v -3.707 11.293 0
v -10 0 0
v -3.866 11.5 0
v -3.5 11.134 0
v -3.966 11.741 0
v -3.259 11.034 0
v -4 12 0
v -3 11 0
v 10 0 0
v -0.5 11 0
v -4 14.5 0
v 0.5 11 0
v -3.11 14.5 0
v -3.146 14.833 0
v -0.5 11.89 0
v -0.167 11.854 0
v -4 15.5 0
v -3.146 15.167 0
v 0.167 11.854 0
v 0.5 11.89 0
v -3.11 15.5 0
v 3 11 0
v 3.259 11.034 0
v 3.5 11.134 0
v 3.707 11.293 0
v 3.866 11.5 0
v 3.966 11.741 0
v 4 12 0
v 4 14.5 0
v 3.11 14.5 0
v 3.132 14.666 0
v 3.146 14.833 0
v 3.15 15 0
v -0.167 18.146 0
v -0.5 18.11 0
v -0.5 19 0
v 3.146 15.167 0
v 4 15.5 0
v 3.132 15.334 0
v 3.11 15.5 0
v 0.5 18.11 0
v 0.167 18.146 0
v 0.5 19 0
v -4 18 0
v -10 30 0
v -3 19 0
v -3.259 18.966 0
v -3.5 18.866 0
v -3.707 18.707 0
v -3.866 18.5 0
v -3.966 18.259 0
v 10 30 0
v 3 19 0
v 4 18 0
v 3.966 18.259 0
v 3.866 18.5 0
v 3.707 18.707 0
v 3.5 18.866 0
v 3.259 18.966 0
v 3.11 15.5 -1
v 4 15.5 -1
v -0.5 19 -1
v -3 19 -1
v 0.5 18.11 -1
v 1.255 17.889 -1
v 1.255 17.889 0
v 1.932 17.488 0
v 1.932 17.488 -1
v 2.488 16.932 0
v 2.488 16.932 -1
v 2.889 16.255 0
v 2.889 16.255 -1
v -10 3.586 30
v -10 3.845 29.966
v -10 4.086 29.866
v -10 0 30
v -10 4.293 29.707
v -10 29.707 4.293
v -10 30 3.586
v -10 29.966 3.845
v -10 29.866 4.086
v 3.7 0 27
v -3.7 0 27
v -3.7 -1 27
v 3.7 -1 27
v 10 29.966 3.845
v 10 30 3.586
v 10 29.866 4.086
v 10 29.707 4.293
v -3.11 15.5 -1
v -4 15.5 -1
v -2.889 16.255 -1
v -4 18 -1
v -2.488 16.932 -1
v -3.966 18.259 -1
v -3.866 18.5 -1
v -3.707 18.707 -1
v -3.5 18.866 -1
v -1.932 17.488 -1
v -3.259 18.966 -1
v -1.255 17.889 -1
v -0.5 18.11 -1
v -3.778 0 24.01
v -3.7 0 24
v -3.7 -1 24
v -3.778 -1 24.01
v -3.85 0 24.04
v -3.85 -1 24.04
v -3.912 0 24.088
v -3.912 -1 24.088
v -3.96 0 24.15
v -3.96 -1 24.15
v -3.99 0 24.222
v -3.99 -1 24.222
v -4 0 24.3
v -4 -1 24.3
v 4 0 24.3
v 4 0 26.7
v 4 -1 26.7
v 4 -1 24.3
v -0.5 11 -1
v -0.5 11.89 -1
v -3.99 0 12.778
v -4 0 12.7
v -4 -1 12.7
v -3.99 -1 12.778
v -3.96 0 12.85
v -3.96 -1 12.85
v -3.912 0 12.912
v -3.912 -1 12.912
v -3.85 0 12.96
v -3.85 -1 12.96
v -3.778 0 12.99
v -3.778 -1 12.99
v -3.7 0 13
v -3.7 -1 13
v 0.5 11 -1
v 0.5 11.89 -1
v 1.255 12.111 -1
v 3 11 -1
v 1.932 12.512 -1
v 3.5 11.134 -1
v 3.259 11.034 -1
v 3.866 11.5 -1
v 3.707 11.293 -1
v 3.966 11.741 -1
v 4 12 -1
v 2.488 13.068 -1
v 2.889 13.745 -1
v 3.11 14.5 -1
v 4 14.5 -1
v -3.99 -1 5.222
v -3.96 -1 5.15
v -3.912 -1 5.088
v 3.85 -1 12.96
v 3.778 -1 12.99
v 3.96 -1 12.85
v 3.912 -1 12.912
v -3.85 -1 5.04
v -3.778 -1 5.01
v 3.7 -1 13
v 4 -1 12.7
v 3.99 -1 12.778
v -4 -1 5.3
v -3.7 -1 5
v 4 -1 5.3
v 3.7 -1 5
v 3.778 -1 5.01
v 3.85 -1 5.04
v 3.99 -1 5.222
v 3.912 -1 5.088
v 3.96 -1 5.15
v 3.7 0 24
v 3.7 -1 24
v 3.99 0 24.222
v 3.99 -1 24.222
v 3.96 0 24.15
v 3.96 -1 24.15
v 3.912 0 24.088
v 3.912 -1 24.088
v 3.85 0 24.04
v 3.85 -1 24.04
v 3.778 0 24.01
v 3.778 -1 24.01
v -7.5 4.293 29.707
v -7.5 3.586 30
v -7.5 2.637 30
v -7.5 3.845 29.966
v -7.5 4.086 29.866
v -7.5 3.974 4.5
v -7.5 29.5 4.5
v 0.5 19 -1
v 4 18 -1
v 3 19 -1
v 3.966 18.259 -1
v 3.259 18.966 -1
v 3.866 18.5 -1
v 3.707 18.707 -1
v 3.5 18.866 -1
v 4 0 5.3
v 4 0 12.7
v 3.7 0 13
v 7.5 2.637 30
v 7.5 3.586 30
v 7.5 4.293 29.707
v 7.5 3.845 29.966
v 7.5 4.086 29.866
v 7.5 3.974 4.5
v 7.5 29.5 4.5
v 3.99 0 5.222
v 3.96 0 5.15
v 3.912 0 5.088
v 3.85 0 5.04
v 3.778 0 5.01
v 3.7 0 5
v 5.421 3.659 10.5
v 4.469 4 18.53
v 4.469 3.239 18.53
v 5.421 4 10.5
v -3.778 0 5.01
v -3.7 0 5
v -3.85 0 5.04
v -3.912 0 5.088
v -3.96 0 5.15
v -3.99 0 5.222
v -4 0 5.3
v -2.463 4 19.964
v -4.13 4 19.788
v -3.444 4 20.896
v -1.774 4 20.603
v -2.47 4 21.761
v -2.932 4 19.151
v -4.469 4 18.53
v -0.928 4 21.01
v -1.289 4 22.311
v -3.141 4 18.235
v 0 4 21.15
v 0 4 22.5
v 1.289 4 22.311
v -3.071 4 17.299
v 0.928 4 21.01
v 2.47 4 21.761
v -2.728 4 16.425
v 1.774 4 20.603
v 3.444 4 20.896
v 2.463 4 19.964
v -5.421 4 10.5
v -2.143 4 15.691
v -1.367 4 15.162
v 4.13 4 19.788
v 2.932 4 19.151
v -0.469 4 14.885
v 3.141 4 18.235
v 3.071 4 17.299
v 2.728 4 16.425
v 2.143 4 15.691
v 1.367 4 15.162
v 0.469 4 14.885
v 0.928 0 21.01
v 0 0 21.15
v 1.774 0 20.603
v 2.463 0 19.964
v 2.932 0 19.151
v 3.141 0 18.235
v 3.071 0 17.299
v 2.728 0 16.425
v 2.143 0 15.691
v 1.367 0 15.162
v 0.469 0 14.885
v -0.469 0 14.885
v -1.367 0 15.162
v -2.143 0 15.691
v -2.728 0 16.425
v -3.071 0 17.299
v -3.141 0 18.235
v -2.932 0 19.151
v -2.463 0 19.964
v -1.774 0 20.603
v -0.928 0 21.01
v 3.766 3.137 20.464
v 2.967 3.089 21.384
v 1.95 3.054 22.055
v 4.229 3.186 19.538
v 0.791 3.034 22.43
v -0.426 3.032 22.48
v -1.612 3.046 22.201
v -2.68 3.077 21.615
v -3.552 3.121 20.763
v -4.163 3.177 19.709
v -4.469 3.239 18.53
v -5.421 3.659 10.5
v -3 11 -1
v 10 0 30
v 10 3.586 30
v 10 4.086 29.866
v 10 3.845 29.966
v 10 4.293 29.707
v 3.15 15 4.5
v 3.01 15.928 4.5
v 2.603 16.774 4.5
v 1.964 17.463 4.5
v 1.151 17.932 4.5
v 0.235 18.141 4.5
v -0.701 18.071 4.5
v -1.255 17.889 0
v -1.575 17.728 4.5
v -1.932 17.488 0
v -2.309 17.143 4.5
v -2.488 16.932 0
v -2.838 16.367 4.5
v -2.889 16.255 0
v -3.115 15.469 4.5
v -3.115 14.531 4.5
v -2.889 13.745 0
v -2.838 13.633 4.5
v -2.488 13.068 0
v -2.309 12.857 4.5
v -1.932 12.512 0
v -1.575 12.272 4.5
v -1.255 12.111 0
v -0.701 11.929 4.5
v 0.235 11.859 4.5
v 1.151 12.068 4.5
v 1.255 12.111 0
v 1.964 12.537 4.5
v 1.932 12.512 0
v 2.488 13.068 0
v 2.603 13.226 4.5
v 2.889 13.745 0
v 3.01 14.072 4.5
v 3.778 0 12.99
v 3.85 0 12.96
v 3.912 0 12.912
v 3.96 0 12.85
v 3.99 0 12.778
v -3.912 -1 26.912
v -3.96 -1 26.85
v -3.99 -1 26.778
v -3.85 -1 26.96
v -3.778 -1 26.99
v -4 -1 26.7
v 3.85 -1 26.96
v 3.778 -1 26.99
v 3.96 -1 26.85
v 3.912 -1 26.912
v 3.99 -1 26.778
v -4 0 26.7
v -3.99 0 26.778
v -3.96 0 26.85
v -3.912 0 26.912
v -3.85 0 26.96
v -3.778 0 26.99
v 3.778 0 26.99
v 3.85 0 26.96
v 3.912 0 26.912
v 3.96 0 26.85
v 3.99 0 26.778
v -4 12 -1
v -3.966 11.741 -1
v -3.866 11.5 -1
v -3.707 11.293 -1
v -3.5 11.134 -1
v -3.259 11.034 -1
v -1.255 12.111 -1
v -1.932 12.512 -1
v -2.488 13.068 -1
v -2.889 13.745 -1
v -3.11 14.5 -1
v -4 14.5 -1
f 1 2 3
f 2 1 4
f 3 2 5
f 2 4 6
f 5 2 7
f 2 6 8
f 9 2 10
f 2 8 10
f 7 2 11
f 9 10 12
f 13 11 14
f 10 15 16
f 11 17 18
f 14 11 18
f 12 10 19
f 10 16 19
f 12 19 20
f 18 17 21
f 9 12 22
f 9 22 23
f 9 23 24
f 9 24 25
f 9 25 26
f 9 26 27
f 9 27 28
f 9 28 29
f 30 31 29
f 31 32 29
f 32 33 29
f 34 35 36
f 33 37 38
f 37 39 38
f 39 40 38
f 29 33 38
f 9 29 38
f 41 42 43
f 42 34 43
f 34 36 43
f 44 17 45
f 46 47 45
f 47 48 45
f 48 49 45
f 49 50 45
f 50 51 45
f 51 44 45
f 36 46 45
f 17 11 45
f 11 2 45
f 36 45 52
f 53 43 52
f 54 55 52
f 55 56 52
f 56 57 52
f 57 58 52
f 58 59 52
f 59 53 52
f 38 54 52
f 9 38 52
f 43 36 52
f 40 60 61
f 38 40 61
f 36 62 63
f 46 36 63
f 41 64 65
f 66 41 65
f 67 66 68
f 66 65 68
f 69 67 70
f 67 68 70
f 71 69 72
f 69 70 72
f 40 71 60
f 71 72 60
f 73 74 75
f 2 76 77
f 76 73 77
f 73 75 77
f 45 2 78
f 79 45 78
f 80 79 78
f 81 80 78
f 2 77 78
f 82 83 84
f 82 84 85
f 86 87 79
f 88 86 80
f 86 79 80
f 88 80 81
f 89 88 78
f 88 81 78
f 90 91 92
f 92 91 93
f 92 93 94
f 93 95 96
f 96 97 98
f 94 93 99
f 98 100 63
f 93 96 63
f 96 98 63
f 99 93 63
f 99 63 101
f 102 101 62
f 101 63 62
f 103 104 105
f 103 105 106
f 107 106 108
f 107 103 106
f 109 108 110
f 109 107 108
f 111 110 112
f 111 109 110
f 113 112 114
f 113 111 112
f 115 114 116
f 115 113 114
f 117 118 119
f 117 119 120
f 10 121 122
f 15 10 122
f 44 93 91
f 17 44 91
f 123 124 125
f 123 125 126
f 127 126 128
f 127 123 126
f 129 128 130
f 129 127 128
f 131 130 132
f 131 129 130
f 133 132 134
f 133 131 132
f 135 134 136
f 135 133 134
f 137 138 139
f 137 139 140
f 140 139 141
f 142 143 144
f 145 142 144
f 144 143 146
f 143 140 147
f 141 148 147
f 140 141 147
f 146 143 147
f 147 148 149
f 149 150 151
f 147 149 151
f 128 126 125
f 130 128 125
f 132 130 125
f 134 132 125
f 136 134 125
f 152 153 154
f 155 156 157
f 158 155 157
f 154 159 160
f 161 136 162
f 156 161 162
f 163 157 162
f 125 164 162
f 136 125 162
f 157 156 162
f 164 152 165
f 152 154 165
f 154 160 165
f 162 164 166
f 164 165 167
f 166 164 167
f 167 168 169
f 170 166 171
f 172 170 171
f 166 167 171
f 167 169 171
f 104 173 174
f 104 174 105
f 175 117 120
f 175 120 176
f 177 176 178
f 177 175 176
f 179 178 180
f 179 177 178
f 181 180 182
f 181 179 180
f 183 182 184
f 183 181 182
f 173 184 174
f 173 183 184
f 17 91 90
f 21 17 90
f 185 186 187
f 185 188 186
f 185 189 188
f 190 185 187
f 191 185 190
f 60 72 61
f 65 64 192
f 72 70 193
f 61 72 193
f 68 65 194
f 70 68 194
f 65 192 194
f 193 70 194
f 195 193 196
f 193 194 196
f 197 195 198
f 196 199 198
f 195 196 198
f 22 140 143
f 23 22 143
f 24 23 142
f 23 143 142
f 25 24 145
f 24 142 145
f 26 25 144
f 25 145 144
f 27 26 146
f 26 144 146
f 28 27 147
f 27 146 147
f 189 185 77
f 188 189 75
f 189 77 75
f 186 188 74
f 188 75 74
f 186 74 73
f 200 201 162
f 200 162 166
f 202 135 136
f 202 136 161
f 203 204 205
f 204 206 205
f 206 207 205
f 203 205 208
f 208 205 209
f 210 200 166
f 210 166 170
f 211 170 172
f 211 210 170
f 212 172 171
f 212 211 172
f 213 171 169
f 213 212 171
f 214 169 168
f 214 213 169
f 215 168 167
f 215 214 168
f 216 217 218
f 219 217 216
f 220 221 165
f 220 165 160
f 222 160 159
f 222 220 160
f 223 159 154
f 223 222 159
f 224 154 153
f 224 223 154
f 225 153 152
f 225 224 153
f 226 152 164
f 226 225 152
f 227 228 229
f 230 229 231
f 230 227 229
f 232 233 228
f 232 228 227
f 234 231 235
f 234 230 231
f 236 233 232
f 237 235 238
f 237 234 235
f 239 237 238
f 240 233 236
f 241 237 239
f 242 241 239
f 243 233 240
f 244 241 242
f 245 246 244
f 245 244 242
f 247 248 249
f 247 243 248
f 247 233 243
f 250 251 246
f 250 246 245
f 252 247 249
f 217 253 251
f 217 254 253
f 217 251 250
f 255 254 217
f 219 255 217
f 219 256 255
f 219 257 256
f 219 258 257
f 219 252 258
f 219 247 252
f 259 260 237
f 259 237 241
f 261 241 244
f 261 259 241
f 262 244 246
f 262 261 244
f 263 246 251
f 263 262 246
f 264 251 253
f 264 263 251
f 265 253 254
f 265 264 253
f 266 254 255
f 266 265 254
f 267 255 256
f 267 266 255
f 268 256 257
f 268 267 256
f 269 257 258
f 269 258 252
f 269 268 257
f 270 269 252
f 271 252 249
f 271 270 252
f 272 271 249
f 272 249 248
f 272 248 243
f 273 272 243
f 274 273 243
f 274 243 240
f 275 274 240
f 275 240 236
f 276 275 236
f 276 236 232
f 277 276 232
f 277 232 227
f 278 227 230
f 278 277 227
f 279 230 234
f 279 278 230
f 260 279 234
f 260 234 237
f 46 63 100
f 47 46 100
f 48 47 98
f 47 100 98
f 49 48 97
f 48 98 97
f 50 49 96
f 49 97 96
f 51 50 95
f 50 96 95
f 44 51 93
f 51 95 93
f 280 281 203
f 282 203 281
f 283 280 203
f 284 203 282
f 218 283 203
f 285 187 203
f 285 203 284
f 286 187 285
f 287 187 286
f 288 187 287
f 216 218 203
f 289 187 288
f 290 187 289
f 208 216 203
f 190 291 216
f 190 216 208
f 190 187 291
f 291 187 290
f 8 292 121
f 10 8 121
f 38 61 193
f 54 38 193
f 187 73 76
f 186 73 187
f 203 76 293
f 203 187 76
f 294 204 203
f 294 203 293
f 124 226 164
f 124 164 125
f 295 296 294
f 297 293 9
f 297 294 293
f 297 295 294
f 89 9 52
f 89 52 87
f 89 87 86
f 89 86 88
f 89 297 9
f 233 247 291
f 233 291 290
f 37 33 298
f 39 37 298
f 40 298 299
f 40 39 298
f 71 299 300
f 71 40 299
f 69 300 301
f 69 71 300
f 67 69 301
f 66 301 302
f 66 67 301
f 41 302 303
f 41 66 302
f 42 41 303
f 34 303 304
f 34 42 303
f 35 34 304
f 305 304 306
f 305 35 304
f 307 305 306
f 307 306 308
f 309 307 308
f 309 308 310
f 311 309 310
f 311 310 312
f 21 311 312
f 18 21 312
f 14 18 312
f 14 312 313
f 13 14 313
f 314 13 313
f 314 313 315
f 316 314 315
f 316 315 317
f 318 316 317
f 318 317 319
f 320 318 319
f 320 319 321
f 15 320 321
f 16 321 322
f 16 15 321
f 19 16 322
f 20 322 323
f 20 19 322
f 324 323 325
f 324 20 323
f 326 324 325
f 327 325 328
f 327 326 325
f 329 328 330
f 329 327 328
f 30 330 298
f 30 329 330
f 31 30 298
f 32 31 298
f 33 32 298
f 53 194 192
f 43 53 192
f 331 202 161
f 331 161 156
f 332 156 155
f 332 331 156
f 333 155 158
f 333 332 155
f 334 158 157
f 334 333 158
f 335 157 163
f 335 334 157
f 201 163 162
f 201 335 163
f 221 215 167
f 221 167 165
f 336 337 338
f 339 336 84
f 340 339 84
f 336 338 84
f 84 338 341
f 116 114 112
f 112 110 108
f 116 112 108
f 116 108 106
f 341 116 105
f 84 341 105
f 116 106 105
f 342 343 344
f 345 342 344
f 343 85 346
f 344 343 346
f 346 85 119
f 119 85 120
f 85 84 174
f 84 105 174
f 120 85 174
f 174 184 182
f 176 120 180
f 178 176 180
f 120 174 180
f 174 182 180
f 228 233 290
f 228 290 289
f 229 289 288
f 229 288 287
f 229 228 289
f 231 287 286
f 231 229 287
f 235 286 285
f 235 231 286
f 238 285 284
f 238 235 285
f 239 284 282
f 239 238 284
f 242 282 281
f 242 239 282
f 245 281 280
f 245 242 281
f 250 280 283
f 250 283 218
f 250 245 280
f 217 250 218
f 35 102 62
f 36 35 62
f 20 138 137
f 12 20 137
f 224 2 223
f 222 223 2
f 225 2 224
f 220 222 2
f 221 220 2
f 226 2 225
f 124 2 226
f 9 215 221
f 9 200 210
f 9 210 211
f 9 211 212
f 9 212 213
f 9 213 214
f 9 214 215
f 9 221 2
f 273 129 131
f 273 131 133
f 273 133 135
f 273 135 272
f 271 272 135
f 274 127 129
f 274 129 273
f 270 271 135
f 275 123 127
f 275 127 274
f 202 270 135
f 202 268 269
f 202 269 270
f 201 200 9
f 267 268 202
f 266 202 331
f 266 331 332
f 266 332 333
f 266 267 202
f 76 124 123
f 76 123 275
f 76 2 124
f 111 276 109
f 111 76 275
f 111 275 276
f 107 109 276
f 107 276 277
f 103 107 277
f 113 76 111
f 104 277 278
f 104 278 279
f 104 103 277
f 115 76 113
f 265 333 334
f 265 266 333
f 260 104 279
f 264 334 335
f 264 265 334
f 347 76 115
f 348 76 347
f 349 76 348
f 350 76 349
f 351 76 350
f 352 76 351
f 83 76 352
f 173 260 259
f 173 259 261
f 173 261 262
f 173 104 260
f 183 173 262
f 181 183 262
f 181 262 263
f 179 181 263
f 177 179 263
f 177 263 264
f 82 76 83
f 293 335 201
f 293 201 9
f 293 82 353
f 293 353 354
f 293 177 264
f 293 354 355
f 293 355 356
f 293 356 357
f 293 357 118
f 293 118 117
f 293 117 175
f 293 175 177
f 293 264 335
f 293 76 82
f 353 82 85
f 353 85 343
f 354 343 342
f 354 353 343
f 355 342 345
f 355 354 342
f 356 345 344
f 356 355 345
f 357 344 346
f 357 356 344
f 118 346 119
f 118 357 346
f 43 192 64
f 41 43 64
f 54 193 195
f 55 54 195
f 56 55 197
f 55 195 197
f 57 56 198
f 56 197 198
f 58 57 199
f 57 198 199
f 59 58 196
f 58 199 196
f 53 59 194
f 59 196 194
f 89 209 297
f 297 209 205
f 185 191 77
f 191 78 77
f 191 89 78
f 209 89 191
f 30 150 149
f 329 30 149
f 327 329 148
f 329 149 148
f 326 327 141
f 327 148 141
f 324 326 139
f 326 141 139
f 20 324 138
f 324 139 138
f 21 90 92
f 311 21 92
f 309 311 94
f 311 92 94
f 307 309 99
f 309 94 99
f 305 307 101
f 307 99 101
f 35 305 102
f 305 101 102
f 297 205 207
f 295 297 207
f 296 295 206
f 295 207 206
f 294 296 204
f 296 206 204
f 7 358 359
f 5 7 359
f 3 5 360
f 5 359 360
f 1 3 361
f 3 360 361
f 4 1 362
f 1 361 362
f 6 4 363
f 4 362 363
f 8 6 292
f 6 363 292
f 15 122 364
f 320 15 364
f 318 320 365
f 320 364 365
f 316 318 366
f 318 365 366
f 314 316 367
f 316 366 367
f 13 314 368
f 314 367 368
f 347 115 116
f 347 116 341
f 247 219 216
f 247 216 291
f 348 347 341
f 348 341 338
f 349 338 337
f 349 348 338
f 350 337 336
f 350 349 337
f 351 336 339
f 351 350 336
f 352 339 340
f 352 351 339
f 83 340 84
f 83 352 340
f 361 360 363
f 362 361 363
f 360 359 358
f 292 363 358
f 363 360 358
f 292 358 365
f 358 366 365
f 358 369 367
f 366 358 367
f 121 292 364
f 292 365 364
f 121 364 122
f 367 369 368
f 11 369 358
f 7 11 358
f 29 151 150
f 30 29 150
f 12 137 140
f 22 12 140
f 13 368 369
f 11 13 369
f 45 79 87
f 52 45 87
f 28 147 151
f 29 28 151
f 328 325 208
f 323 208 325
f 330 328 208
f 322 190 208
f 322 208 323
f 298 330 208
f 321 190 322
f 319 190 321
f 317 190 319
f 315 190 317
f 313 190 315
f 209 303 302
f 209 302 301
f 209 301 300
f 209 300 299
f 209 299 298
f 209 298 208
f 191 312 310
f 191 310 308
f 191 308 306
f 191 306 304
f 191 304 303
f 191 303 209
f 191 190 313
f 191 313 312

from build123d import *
from build123d.topology import SkipClean

# Parameters (mm, degrees)
BOSS_EXTRUDE1_DEPTH      = 10
BOSS_EXTRUDE1_DEPTH_BACK = 10
CUT_EXTRUDE1_DEPTH       = 7.5
CUT_EXTRUDE1_DEPTH_BACK  = 7.5
BOSS_EXTRUDE2_DEPTH      = 2
SKETCH4_R                = 3.15
CUT_EXTRUDE2_DEPTH       = 5
SKETCH5_R                = 3.15
CUT_EXTRUDE3_DEPTH       = 4
SKETCH6_W                = 20
SKETCH6_H                = 30
BOSS_EXTRUDE3_DEPTH      = 1
SKETCH7_W                = 20
SKETCH7_H                = 30
CUT_EXTRUDE4_DEPTH       = 1
SKETCH8_W                = 20
SKETCH8_H                = 30
BOSS_EXTRUDE4_DEPTH      = 1
CUT_EXTRUDE5_START       = -1
SKETCH9_W                = 20
SKETCH9_H                = 30
CUT_EXTRUDE5_DEPTH       = 1


with BuildPart() as part:
    # Sketch1 → Boss-Extrude1 (new, two sides: drawn at the far end of the back side and taken through both)
    with BuildSketch(Plane(origin=(0, 0, 0), x_dir=(0, 0, -1), z_dir=(1, 0, 0)).offset(-BOSS_EXTRUDE1_DEPTH_BACK)):
        with BuildLine():
            Line((-30, 0), (0, 0))
            Line((0, 0), (0, 30))
            Line((0, 30), (-3.585786438, 30))
            ThreePointArc((-3.585786438, 30), (-3.96846987, 29.923879533), (-4.292893219, 29.707106781))
            Line((-4.292893219, 29.707106781), (-29.707106781, 4.292893219))
            ThreePointArc((-29.707106781, 4.292893219), (-29.923879533, 3.96846987), (-30, 3.585786438))
            Line((-30, 3.585786438), (-30, 0))
        make_face()
    extrude(amount=BOSS_EXTRUDE1_DEPTH + BOSS_EXTRUDE1_DEPTH_BACK)

    # Sketch2 → Cut-Extrude1 (cut, two sides: drawn at the far end of the back side and taken through both)
    with BuildSketch(Plane(origin=(0, 0, 0), x_dir=(0, 0, -1), z_dir=(1, 0, 0)).offset(-CUT_EXTRUDE1_DEPTH_BACK)):
        Polygon((-34, 2.427766622), (-4.5, 3.97379611), (-4.5, 34), (-34, 34), align=None)
    extrude(amount=CUT_EXTRUDE1_DEPTH + CUT_EXTRUDE1_DEPTH_BACK, mode=Mode.SUBTRACT)

    # Sketch3 → Boss-Extrude2 (add)
    with BuildSketch(Plane(origin=(0, 4, 0), x_dir=(1, 0, 0), z_dir=(0, 1, 0))):
        with BuildLine():
            Line((-5.420884207, -10.5), (-4.4686916, -18.529901296))
            ThreePointArc((-4.4686916, -18.529901296), (0, -22.5), (4.4686916, -18.529901296))
            Line((4.4686916, -18.529901296), (5.420884207, -10.5))
            Line((5.420884207, -10.5), (-5.420884207, -10.5))
        make_face()
    extrude(amount=-BOSS_EXTRUDE2_DEPTH)

    # Sketch4 → Cut-Extrude2 (cut)
    with BuildSketch(Plane.XY):
        with Locations((0, 15)):
            Circle(SKETCH4_R)
    extrude(amount=CUT_EXTRUDE2_DEPTH, mode=Mode.SUBTRACT)

    # Sketch5 → Cut-Extrude3 (cut)
    with BuildSketch(Plane(origin=(0, 0, 0), x_dir=(1, 0, 0), z_dir=(0, 1, 0))):
        with Locations(Location((0, -18, 0), (0, 0, 270))):
            Circle(SKETCH5_R)
    extrude(amount=CUT_EXTRUDE3_DEPTH, mode=Mode.SUBTRACT)

    # Sketch6 → Boss-Extrude3 (add)
    with BuildSketch(Plane(origin=(0, 0, 0), x_dir=(1, 0, 0), z_dir=(0, 1, 0))):
        with Locations((0, -15)):
            Rectangle(SKETCH6_W, SKETCH6_H)
    extrude(amount=-BOSS_EXTRUDE3_DEPTH)

    # Sketch7 → Cut-Extrude4 (cut)
    with BuildSketch(Plane(origin=(0, 0, 0), x_dir=(1, 0, 0), z_dir=(0, 1, 0))):
        with Locations((0, -15)):
            Rectangle(SKETCH7_W, SKETCH7_H)
        with BuildLine():
            Line((-3.7, -13), (3.7, -13))
            ThreePointArc((3.7, -13), (3.912132034, -12.912132034), (4, -12.7))
            Line((4, -12.7), (4, -5.3))
            ThreePointArc((4, -5.3), (3.912132034, -5.087867966), (3.7, -5))
            Line((3.7, -5), (-3.7, -5))
            ThreePointArc((-3.7, -5), (-3.912132034, -5.087867966), (-4, -5.3))
            Line((-4, -5.3), (-4, -12.7))
            ThreePointArc((-4, -12.7), (-3.912132034, -12.912132034), (-3.7, -13))
        make_face(mode=Mode.SUBTRACT)
        with BuildLine():
            Line((-3.7, -27), (3.7, -27))
            ThreePointArc((3.7, -27), (3.912132034, -26.912132034), (4, -26.7))
            Line((4, -26.7), (4, -24.3))
            ThreePointArc((4, -24.3), (3.912132034, -24.087867966), (3.7, -24))
            Line((3.7, -24), (-3.7, -24))
            ThreePointArc((-3.7, -24), (-3.912132034, -24.087867966), (-4, -24.3))
            Line((-4, -24.3), (-4, -26.7))
            ThreePointArc((-4, -26.7), (-3.912132034, -26.912132034), (-3.7, -27))
        make_face(mode=Mode.SUBTRACT)
    extrude(amount=-CUT_EXTRUDE4_DEPTH, mode=Mode.SUBTRACT)

    # Sketch8 → Boss-Extrude4 (add)
    with BuildSketch(Plane.XY):
        with Locations((0, 15)):
            Rectangle(SKETCH8_W, SKETCH8_H)
    extrude(amount=-BOSS_EXTRUDE4_DEPTH)

    # Sketch9 → Cut-Extrude5 (cut)
    with SkipClean():  # the faces are left unmerged after this step: merging them gives an invalid solid
        with BuildSketch(Plane.XY.offset(CUT_EXTRUDE5_START)):
            with Locations((0, 15)):
                Rectangle(SKETCH9_W, SKETCH9_H)
            with BuildLine():
                Line((0.5, 11), (3, 11))
                ThreePointArc((3, 11), (3.707106781, 11.292893219), (4, 12))
                Line((4, 12), (4, 14.5))
                Line((4, 14.5), (3.110064308, 14.5))
                ThreePointArc((3.110064308, 14.5), (2.227386361, 12.772613639), (0.5, 11.889935692))
                Line((0.5, 11.889935692), (0.5, 11))
            make_face(mode=Mode.SUBTRACT)
            with BuildLine():
                Line((0.5, 19), (0.5, 18.110064308))
                ThreePointArc((0.5, 18.110064308), (2.227386361, 17.227386361), (3.110064308, 15.5))
                Line((3.110064308, 15.5), (4, 15.5))
                Line((4, 15.5), (4, 18))
                ThreePointArc((4, 18), (3.707106781, 18.707106781), (3, 19))
                Line((3, 19), (0.5, 19))
            make_face(mode=Mode.SUBTRACT)
            with BuildLine():
                Line((-3, 11), (-0.5, 11))
                Line((-0.5, 11), (-0.5, 11.889935692))
                ThreePointArc((-0.5, 11.889935692), (-2.227386361, 12.772613639), (-3.110064308, 14.5))
                Line((-3.110064308, 14.5), (-4, 14.5))
                Line((-4, 14.5), (-4, 12))
                ThreePointArc((-4, 12), (-3.707106781, 11.292893219), (-3, 11))
            make_face(mode=Mode.SUBTRACT)
            with BuildLine():
                Line((-4, 15.5), (-3.110064308, 15.5))
                ThreePointArc((-3.110064308, 15.5), (-2.227386361, 17.227386361), (-0.5, 18.110064308))
                Line((-0.5, 18.110064308), (-0.5, 19))
                Line((-0.5, 19), (-3, 19))
                ThreePointArc((-3, 19), (-3.707106781, 18.707106781), (-4, 18))
                Line((-4, 18), (-4, 15.5))
            make_face(mode=Mode.SUBTRACT)
        extrude(amount=CUT_EXTRUDE5_DEPTH, mode=Mode.SUBTRACT)


solid = part.part
